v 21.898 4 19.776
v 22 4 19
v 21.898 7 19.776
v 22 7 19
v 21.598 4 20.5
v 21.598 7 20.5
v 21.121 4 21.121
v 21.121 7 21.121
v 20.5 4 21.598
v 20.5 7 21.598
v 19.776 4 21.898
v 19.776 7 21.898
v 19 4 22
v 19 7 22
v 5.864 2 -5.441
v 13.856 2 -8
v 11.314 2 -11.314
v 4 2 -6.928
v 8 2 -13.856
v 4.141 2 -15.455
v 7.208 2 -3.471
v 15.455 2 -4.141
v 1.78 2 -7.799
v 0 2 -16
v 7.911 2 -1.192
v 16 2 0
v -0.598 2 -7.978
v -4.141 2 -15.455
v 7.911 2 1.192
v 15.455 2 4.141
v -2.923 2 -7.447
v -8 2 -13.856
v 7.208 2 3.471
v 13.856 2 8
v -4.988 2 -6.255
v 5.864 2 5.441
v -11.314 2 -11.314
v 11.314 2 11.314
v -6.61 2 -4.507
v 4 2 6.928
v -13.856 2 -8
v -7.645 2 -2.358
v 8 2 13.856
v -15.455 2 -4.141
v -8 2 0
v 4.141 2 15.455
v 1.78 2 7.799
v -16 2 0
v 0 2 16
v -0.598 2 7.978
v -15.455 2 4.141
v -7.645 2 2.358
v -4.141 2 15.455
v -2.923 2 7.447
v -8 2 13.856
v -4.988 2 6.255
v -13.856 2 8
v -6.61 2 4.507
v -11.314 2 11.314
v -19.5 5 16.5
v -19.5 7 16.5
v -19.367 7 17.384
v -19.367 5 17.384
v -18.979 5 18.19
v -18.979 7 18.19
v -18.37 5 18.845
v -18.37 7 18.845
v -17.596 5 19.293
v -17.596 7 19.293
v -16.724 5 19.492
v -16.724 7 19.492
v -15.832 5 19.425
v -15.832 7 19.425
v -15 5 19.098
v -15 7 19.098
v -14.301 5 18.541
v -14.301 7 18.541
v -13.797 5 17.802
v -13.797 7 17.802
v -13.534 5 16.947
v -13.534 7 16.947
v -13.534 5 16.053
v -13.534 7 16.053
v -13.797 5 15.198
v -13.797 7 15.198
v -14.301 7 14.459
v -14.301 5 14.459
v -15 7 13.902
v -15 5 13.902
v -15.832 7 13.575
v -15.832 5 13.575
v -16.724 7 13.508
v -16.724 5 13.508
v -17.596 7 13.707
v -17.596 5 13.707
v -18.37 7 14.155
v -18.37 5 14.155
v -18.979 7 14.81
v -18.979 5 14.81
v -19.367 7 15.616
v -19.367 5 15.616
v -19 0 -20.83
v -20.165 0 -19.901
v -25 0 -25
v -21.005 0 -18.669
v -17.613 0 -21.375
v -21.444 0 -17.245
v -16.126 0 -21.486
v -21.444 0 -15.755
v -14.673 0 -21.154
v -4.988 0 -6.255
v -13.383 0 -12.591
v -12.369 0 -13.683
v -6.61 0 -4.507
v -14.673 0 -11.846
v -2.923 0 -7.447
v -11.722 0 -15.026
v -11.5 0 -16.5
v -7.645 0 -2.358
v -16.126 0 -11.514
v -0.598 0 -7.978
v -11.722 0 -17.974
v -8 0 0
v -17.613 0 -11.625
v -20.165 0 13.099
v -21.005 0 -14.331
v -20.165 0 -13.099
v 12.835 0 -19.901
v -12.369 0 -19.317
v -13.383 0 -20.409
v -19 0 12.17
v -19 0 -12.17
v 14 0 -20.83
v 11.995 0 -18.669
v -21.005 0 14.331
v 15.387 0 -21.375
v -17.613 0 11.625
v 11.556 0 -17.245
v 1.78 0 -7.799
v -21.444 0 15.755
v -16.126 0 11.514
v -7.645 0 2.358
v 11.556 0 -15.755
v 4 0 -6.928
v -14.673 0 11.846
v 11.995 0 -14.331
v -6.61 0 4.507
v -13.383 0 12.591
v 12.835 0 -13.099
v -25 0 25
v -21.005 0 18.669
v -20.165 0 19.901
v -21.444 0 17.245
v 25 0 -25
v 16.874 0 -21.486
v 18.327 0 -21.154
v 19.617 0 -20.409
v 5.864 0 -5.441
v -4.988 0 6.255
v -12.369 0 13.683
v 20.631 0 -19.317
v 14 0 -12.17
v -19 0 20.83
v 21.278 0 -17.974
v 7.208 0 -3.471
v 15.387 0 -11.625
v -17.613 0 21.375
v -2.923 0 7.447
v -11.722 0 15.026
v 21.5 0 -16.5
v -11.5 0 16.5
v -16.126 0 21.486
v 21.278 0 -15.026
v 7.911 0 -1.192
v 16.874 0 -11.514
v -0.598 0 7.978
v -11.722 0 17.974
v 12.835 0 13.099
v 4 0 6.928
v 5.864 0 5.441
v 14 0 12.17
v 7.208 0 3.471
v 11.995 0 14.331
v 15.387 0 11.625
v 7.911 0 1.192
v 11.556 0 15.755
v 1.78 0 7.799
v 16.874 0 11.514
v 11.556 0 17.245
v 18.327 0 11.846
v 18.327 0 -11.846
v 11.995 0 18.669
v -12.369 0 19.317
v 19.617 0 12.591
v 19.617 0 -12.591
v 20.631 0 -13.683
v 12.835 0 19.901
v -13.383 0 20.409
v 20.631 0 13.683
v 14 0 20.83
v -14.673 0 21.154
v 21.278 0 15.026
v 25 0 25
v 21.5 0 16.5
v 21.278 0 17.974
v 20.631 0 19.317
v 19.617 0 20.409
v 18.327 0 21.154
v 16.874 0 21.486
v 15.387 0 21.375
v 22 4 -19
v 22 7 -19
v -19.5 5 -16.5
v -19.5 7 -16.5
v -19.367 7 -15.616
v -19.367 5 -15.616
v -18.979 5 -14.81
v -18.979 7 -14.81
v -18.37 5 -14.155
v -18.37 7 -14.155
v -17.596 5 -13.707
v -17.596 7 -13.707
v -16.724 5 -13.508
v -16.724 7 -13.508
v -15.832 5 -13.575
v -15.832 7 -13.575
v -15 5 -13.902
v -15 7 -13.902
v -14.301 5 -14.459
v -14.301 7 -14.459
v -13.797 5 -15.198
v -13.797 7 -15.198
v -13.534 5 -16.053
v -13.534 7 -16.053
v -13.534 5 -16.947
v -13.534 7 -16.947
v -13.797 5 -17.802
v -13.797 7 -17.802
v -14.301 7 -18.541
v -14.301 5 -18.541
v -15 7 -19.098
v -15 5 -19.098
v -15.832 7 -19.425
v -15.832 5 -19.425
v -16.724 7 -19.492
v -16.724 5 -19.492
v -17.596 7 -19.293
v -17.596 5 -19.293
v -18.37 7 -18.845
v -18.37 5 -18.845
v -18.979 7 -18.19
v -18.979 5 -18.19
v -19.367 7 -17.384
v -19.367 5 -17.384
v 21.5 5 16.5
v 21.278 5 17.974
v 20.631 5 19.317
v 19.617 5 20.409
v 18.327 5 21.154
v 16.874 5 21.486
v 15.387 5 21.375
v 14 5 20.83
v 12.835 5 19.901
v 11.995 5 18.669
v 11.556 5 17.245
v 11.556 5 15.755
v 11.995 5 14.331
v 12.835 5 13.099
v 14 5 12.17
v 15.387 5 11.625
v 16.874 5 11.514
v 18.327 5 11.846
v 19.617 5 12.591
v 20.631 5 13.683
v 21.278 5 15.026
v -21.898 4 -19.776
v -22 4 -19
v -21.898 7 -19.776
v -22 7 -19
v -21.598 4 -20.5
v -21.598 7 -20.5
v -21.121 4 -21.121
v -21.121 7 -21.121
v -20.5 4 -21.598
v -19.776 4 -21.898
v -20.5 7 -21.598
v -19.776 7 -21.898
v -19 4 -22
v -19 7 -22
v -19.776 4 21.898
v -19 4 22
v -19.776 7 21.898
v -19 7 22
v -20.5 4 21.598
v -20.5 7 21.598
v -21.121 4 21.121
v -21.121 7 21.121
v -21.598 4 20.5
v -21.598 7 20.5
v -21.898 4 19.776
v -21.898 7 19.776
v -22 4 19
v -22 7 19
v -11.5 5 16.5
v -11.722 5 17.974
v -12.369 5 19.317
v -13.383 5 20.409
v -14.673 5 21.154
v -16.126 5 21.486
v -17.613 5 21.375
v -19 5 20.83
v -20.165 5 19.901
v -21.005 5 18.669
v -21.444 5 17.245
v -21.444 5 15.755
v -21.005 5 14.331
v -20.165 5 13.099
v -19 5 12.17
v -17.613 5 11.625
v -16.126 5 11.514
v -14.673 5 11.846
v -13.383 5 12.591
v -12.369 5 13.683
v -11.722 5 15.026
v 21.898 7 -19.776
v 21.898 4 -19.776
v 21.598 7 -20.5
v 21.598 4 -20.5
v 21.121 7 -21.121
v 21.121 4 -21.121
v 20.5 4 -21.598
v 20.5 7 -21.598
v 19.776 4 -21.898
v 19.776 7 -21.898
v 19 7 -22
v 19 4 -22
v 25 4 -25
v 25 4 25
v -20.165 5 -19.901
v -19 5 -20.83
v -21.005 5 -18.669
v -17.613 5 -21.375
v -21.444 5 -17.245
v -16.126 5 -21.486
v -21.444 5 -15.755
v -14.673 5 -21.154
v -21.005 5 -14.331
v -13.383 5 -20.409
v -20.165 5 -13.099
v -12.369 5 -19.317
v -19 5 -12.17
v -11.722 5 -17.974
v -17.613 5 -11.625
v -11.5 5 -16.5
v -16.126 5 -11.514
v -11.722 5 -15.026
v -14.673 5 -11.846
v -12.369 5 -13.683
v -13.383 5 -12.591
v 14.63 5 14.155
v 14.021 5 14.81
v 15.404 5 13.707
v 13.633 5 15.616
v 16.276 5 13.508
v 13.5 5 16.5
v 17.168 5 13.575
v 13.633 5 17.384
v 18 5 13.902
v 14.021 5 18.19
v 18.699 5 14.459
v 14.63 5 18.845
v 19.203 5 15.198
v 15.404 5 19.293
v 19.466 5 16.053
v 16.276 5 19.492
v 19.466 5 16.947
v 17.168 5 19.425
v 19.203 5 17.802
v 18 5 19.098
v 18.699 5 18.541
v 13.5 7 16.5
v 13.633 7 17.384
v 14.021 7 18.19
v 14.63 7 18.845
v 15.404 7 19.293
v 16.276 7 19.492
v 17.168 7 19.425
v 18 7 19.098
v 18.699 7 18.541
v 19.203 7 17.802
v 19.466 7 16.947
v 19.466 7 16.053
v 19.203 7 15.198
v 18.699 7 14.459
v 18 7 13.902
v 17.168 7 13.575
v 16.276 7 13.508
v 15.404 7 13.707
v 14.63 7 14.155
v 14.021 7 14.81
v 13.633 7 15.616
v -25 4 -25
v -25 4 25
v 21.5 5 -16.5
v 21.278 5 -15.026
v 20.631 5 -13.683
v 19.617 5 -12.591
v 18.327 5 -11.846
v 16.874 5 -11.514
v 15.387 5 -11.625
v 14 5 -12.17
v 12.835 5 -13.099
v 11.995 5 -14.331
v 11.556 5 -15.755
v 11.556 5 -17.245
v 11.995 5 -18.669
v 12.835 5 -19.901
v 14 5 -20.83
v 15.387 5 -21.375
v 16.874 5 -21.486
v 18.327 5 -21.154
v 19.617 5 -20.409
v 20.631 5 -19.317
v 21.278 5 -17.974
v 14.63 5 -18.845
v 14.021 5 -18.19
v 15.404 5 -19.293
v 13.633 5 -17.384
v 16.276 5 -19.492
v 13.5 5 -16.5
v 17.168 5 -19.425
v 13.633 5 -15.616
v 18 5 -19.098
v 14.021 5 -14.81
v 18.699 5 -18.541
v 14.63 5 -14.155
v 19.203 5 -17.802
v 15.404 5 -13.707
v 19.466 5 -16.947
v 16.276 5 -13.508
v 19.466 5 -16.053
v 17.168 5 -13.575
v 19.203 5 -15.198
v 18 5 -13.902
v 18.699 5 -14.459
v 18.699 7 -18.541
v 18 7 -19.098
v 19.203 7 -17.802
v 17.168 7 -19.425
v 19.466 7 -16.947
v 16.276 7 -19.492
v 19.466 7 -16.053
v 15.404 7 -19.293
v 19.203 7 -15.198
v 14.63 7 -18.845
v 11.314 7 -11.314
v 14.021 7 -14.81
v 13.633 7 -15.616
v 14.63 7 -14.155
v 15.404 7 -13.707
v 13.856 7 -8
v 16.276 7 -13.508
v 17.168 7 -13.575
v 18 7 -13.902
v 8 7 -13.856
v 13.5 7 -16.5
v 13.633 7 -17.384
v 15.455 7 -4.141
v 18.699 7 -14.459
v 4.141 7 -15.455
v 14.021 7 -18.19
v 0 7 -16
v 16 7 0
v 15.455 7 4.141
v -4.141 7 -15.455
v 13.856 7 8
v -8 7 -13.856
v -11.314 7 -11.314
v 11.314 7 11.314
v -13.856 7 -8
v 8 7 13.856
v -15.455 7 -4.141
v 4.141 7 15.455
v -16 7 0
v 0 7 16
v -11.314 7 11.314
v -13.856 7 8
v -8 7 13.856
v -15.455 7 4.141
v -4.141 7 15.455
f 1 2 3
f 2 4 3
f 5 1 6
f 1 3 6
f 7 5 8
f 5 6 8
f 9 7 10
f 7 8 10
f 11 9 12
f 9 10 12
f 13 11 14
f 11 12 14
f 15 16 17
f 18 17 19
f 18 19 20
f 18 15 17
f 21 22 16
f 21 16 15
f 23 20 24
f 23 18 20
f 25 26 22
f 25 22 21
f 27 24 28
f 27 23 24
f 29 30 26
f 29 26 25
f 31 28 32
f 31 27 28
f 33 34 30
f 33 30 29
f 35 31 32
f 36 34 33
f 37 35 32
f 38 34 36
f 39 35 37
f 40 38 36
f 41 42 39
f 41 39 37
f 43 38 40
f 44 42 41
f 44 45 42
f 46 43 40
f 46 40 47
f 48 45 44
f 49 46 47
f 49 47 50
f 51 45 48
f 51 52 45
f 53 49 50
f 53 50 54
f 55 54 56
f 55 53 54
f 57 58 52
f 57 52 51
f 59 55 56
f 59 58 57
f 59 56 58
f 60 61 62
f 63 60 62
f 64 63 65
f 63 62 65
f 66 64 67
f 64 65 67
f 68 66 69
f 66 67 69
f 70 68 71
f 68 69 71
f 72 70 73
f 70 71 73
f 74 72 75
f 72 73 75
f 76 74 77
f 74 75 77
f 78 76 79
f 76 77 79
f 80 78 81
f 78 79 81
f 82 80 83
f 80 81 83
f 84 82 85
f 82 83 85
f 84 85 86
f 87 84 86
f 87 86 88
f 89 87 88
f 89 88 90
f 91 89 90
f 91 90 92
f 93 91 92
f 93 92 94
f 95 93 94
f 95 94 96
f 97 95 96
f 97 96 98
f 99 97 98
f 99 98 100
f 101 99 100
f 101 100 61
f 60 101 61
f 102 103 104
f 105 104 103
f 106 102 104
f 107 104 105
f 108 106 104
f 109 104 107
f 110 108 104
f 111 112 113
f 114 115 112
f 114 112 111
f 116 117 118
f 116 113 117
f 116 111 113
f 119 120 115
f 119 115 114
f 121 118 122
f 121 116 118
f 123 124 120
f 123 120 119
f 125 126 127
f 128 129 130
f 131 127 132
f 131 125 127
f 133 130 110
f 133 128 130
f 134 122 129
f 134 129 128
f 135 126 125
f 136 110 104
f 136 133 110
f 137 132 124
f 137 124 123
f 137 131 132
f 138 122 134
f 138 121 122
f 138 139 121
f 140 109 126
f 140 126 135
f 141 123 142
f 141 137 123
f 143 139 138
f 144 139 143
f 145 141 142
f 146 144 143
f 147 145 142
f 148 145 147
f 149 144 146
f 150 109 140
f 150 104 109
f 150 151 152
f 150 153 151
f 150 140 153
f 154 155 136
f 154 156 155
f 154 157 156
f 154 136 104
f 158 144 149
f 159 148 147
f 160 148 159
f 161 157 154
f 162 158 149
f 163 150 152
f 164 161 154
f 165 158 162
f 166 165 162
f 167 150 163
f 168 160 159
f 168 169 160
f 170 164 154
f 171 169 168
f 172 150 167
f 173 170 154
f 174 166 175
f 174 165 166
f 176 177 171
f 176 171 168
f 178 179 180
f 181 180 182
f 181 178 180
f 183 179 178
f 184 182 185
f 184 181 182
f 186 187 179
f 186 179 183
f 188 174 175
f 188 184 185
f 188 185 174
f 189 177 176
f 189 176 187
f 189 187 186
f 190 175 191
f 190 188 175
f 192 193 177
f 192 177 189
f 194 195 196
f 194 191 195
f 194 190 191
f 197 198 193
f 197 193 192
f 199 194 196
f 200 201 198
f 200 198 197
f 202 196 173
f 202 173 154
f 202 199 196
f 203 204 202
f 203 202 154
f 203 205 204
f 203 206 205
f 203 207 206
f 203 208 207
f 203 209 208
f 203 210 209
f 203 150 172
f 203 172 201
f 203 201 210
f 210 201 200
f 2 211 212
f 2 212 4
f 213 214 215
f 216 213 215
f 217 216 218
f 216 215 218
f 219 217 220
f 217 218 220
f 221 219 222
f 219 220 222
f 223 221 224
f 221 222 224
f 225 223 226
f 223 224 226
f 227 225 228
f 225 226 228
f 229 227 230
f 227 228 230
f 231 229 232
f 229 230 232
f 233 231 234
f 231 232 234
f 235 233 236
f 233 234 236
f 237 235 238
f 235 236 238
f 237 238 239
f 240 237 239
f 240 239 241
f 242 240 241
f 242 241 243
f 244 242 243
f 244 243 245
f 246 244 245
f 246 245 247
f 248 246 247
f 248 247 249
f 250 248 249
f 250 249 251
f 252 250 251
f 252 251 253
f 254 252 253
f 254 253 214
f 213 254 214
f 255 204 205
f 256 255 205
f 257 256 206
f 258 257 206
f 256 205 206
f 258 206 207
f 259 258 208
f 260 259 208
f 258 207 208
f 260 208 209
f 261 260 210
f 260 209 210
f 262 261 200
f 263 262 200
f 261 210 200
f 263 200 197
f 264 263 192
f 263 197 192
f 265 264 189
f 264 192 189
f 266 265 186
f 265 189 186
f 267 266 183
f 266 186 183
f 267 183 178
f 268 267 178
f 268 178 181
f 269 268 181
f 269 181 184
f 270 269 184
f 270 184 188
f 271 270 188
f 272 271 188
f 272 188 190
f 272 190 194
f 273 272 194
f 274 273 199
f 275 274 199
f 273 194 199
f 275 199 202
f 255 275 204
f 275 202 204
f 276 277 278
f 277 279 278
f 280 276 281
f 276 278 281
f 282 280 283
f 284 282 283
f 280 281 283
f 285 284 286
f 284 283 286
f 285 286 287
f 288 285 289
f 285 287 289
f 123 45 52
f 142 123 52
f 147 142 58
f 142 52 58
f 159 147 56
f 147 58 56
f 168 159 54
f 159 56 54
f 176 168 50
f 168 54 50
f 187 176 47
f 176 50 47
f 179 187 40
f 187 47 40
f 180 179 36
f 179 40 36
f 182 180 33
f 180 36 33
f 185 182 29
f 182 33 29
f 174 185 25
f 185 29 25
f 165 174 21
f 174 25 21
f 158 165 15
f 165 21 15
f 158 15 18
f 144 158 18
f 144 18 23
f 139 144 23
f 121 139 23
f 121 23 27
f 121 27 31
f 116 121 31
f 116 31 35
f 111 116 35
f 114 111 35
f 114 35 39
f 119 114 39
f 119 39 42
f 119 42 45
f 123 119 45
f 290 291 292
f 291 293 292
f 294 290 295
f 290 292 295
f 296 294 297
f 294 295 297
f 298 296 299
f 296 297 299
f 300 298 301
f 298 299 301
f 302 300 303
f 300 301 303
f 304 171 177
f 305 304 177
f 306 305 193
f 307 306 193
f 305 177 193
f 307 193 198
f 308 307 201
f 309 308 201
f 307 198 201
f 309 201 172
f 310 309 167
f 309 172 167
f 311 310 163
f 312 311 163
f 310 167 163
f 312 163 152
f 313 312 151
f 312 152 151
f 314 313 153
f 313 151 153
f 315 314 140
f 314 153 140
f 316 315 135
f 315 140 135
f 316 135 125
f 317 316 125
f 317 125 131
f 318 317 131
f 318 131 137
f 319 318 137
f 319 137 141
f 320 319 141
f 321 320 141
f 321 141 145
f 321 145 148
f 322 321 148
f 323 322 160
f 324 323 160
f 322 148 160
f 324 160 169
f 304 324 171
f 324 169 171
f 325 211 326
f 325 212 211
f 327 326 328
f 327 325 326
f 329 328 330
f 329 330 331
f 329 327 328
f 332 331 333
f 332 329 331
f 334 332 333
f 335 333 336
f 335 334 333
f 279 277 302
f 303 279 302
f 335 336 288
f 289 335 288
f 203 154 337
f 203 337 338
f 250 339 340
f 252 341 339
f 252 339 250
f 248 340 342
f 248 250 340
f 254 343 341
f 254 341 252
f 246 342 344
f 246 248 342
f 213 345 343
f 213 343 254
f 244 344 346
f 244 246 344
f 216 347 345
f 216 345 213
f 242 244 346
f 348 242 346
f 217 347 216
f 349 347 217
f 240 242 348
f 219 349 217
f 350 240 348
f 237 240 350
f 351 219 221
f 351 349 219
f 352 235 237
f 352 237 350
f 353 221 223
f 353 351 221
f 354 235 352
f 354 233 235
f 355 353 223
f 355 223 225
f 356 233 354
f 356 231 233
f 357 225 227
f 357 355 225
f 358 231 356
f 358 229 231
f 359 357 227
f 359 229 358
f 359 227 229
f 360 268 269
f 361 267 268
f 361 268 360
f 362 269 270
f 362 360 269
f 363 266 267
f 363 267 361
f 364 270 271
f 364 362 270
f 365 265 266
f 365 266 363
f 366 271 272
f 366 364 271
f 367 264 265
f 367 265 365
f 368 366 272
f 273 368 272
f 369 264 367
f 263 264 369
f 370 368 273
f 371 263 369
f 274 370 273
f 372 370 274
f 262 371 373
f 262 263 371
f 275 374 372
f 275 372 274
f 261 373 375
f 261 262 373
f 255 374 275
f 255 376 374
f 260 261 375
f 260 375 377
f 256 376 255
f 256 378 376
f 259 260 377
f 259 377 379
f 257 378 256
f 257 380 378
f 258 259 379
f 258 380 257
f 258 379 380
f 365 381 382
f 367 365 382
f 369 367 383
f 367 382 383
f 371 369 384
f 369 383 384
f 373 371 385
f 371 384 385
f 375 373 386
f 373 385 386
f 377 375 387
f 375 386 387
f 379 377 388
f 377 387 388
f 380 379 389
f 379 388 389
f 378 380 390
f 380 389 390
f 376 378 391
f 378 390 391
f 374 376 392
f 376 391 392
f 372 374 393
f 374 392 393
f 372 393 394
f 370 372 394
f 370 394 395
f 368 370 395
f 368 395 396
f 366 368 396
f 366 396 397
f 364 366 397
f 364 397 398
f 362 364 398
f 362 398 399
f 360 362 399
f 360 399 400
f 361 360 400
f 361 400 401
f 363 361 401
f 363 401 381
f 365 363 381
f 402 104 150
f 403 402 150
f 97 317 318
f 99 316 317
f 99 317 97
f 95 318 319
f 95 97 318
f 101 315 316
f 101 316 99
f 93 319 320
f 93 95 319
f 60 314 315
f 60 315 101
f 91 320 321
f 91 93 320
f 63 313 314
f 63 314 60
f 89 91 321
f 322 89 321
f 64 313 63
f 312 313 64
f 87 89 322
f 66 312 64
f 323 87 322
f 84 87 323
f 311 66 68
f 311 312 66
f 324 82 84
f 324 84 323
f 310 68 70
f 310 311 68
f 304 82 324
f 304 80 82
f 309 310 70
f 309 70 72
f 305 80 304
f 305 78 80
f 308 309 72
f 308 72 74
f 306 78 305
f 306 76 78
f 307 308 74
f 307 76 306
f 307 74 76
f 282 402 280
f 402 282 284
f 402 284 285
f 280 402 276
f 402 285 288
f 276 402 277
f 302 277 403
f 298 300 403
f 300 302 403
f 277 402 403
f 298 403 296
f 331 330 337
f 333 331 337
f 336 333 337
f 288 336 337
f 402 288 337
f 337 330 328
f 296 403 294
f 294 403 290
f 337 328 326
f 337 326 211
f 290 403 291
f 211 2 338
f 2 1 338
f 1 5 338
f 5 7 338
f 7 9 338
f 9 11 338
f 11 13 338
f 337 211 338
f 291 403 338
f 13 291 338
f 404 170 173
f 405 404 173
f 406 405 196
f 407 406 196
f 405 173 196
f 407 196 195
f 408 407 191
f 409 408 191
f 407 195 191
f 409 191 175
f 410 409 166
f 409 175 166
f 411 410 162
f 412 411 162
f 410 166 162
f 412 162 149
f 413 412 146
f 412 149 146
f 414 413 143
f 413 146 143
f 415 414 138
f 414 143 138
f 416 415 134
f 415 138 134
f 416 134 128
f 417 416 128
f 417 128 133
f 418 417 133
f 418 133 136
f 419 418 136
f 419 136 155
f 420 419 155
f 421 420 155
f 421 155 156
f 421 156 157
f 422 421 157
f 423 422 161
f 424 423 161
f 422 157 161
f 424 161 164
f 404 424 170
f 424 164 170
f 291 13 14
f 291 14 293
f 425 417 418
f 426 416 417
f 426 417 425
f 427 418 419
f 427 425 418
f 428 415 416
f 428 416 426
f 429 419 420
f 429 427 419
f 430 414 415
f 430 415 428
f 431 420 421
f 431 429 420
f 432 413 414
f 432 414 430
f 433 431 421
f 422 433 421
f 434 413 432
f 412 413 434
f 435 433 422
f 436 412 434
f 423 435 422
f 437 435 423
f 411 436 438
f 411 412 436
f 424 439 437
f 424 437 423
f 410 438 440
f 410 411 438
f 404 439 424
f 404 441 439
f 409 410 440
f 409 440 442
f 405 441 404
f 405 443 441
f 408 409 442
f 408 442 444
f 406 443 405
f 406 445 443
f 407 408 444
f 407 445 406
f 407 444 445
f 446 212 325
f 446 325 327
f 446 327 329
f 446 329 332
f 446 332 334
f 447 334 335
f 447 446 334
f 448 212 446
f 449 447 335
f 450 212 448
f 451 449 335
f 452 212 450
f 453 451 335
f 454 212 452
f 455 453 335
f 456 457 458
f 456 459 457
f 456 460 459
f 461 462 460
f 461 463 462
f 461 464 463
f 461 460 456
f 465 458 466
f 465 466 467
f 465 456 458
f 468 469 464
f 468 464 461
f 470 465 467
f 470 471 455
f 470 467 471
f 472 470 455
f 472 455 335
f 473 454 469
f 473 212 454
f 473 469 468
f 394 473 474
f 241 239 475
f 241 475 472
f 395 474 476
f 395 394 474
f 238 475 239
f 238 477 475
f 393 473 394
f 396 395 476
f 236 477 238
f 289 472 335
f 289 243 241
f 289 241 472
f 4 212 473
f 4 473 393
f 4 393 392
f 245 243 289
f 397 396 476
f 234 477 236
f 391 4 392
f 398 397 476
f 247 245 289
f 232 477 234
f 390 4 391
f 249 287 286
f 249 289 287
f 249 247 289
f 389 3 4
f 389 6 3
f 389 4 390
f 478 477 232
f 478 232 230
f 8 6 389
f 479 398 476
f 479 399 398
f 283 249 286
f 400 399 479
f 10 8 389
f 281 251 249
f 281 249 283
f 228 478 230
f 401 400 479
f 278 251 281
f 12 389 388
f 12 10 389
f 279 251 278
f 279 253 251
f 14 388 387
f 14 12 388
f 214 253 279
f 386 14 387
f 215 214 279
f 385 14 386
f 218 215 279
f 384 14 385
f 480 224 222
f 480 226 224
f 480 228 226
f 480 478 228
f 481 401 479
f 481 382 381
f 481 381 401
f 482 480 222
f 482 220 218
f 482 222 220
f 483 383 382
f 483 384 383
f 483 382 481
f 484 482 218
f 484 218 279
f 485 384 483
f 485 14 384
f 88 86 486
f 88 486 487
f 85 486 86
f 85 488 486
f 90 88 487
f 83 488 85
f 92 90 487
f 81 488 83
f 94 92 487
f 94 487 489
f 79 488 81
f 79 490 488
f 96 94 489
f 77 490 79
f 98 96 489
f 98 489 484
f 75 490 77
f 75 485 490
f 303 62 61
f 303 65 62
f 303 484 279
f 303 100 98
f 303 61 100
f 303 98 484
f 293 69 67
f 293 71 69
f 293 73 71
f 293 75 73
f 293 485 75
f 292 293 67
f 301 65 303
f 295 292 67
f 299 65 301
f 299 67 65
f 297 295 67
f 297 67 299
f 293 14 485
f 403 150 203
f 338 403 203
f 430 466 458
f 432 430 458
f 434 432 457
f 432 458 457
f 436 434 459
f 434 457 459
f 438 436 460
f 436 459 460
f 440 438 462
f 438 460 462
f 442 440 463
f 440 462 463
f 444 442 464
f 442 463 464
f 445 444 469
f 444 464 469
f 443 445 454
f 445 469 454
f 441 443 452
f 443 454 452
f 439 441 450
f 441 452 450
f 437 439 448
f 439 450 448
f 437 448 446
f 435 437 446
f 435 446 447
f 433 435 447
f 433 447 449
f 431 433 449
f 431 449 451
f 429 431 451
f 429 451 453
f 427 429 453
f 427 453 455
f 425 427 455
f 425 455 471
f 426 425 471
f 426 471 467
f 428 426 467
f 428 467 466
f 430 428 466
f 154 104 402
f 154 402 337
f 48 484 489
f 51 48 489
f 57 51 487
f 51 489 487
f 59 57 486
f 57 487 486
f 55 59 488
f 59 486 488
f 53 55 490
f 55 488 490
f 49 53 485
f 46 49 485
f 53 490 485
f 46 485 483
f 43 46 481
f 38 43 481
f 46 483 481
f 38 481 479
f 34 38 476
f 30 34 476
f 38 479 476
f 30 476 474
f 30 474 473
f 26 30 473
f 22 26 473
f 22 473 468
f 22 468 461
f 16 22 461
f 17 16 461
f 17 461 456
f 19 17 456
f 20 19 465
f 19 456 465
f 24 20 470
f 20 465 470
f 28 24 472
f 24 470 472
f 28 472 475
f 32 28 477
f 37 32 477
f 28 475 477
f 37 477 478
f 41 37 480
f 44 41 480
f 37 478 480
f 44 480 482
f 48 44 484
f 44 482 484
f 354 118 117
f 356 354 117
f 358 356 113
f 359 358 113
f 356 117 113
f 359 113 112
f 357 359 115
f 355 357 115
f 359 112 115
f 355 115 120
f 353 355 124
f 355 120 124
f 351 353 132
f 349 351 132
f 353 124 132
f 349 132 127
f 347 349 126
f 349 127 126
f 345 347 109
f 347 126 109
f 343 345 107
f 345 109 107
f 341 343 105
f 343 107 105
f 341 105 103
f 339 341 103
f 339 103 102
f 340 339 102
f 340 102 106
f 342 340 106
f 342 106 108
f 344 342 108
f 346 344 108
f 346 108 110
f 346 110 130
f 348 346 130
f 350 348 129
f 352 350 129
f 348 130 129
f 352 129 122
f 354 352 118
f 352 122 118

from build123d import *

# Parameters (mm, degrees)
F0_W      = 50
F0_H      = 50
F1_DEPTH  = 4
F2_W      = 44
F2_H      = 44
F3_DEPTH  = 3
F4_R      = 3
F5_DEPTH  = 25
F6_R      = 5
F6_R_2    = 3
F7_DEPTH  = 5
F8_R      = 16
F9_DEPTH  = 5
F10_R     = 8
F11_DEPTH = 25
F12_R     = 3


# Not quite as in the source:
# - a feature names something its author has since deleted; it is built from what else it names


with BuildPart() as f1:
    # F0 (on Front) → F1 (new body)
    with BuildSketch(Plane.XZ):
        Rectangle(F0_W, F0_H)
    extrude(amount=-F1_DEPTH)

    # F2 (on face) → F3 (join)
    with BuildSketch(Plane(origin=(0, 4, 0), x_dir=(-1, 0, 0), z_dir=(0, 1, 0))):
        Rectangle(F2_W, F2_H)
    extrude(amount=F3_DEPTH)

    # F4 (on face) → F5 (cut)
    with BuildSketch(Plane(origin=(0, 7, 0), x_dir=(-1, 0, 0), z_dir=(0, 1, 0))):
        with Locations((-16.5, 16.5)):
            Circle(F4_R)
        with Locations((16.5, 16.5)):
            Circle(F4_R)
        with Locations((16.5, -16.5)):
            Circle(F4_R)
        with Locations((-16.5, -16.5)):
            Circle(F4_R)
    extrude(amount=-F5_DEPTH, mode=Mode.SUBTRACT)

    # F6 (on face) → F7 (cut)
    with BuildSketch(Plane.XZ):
        with Locations((-16.5, 16.5)):
            Circle(F6_R)
        with Locations((-16.5, 16.5)):
            Circle(F6_R_2, mode=Mode.SUBTRACT)
        with Locations((16.5, 16.5)):
            Circle(F6_R)
        with Locations((16.5, 16.5)):
            Circle(F6_R_2, mode=Mode.SUBTRACT)
        with Locations((16.5, -16.5)):
            Circle(F6_R)
        with Locations((16.5, -16.5)):
            Circle(F6_R_2, mode=Mode.SUBTRACT)
        with Locations((-16.5, -16.5)):
            Circle(F6_R)
        with Locations((-16.5, -16.5)):
            Circle(F6_R_2, mode=Mode.SUBTRACT)
    extrude(amount=-F7_DEPTH, mode=Mode.SUBTRACT)

    # F8 (on face) → F9 (cut)
    with BuildSketch(Plane(origin=(0, 7, 0), x_dir=(-1, 0, 0), z_dir=(0, 1, 0))):
        Circle(F8_R)
    extrude(amount=-F9_DEPTH, mode=Mode.SUBTRACT)

    # F10 (on face) → F11 (cut)
    with BuildSketch(Plane(origin=(0, 2, 0), x_dir=(-1, 0, 0), z_dir=(0, 1, 0))):
        Circle(F10_R)
    extrude(amount=-F11_DEPTH, mode=Mode.SUBTRACT)

    # F12
    f12_edges = [f1.edges().sort_by_distance(p)[0] for p in [
        (-22, 5.5, 22),
        (-22, 5.5, -22),
        (22, 5.5, -22),
        (22, 5.5, 22),
    ]]
    fillet(f12_edges, radius=F12_R)


solid = f1.part
